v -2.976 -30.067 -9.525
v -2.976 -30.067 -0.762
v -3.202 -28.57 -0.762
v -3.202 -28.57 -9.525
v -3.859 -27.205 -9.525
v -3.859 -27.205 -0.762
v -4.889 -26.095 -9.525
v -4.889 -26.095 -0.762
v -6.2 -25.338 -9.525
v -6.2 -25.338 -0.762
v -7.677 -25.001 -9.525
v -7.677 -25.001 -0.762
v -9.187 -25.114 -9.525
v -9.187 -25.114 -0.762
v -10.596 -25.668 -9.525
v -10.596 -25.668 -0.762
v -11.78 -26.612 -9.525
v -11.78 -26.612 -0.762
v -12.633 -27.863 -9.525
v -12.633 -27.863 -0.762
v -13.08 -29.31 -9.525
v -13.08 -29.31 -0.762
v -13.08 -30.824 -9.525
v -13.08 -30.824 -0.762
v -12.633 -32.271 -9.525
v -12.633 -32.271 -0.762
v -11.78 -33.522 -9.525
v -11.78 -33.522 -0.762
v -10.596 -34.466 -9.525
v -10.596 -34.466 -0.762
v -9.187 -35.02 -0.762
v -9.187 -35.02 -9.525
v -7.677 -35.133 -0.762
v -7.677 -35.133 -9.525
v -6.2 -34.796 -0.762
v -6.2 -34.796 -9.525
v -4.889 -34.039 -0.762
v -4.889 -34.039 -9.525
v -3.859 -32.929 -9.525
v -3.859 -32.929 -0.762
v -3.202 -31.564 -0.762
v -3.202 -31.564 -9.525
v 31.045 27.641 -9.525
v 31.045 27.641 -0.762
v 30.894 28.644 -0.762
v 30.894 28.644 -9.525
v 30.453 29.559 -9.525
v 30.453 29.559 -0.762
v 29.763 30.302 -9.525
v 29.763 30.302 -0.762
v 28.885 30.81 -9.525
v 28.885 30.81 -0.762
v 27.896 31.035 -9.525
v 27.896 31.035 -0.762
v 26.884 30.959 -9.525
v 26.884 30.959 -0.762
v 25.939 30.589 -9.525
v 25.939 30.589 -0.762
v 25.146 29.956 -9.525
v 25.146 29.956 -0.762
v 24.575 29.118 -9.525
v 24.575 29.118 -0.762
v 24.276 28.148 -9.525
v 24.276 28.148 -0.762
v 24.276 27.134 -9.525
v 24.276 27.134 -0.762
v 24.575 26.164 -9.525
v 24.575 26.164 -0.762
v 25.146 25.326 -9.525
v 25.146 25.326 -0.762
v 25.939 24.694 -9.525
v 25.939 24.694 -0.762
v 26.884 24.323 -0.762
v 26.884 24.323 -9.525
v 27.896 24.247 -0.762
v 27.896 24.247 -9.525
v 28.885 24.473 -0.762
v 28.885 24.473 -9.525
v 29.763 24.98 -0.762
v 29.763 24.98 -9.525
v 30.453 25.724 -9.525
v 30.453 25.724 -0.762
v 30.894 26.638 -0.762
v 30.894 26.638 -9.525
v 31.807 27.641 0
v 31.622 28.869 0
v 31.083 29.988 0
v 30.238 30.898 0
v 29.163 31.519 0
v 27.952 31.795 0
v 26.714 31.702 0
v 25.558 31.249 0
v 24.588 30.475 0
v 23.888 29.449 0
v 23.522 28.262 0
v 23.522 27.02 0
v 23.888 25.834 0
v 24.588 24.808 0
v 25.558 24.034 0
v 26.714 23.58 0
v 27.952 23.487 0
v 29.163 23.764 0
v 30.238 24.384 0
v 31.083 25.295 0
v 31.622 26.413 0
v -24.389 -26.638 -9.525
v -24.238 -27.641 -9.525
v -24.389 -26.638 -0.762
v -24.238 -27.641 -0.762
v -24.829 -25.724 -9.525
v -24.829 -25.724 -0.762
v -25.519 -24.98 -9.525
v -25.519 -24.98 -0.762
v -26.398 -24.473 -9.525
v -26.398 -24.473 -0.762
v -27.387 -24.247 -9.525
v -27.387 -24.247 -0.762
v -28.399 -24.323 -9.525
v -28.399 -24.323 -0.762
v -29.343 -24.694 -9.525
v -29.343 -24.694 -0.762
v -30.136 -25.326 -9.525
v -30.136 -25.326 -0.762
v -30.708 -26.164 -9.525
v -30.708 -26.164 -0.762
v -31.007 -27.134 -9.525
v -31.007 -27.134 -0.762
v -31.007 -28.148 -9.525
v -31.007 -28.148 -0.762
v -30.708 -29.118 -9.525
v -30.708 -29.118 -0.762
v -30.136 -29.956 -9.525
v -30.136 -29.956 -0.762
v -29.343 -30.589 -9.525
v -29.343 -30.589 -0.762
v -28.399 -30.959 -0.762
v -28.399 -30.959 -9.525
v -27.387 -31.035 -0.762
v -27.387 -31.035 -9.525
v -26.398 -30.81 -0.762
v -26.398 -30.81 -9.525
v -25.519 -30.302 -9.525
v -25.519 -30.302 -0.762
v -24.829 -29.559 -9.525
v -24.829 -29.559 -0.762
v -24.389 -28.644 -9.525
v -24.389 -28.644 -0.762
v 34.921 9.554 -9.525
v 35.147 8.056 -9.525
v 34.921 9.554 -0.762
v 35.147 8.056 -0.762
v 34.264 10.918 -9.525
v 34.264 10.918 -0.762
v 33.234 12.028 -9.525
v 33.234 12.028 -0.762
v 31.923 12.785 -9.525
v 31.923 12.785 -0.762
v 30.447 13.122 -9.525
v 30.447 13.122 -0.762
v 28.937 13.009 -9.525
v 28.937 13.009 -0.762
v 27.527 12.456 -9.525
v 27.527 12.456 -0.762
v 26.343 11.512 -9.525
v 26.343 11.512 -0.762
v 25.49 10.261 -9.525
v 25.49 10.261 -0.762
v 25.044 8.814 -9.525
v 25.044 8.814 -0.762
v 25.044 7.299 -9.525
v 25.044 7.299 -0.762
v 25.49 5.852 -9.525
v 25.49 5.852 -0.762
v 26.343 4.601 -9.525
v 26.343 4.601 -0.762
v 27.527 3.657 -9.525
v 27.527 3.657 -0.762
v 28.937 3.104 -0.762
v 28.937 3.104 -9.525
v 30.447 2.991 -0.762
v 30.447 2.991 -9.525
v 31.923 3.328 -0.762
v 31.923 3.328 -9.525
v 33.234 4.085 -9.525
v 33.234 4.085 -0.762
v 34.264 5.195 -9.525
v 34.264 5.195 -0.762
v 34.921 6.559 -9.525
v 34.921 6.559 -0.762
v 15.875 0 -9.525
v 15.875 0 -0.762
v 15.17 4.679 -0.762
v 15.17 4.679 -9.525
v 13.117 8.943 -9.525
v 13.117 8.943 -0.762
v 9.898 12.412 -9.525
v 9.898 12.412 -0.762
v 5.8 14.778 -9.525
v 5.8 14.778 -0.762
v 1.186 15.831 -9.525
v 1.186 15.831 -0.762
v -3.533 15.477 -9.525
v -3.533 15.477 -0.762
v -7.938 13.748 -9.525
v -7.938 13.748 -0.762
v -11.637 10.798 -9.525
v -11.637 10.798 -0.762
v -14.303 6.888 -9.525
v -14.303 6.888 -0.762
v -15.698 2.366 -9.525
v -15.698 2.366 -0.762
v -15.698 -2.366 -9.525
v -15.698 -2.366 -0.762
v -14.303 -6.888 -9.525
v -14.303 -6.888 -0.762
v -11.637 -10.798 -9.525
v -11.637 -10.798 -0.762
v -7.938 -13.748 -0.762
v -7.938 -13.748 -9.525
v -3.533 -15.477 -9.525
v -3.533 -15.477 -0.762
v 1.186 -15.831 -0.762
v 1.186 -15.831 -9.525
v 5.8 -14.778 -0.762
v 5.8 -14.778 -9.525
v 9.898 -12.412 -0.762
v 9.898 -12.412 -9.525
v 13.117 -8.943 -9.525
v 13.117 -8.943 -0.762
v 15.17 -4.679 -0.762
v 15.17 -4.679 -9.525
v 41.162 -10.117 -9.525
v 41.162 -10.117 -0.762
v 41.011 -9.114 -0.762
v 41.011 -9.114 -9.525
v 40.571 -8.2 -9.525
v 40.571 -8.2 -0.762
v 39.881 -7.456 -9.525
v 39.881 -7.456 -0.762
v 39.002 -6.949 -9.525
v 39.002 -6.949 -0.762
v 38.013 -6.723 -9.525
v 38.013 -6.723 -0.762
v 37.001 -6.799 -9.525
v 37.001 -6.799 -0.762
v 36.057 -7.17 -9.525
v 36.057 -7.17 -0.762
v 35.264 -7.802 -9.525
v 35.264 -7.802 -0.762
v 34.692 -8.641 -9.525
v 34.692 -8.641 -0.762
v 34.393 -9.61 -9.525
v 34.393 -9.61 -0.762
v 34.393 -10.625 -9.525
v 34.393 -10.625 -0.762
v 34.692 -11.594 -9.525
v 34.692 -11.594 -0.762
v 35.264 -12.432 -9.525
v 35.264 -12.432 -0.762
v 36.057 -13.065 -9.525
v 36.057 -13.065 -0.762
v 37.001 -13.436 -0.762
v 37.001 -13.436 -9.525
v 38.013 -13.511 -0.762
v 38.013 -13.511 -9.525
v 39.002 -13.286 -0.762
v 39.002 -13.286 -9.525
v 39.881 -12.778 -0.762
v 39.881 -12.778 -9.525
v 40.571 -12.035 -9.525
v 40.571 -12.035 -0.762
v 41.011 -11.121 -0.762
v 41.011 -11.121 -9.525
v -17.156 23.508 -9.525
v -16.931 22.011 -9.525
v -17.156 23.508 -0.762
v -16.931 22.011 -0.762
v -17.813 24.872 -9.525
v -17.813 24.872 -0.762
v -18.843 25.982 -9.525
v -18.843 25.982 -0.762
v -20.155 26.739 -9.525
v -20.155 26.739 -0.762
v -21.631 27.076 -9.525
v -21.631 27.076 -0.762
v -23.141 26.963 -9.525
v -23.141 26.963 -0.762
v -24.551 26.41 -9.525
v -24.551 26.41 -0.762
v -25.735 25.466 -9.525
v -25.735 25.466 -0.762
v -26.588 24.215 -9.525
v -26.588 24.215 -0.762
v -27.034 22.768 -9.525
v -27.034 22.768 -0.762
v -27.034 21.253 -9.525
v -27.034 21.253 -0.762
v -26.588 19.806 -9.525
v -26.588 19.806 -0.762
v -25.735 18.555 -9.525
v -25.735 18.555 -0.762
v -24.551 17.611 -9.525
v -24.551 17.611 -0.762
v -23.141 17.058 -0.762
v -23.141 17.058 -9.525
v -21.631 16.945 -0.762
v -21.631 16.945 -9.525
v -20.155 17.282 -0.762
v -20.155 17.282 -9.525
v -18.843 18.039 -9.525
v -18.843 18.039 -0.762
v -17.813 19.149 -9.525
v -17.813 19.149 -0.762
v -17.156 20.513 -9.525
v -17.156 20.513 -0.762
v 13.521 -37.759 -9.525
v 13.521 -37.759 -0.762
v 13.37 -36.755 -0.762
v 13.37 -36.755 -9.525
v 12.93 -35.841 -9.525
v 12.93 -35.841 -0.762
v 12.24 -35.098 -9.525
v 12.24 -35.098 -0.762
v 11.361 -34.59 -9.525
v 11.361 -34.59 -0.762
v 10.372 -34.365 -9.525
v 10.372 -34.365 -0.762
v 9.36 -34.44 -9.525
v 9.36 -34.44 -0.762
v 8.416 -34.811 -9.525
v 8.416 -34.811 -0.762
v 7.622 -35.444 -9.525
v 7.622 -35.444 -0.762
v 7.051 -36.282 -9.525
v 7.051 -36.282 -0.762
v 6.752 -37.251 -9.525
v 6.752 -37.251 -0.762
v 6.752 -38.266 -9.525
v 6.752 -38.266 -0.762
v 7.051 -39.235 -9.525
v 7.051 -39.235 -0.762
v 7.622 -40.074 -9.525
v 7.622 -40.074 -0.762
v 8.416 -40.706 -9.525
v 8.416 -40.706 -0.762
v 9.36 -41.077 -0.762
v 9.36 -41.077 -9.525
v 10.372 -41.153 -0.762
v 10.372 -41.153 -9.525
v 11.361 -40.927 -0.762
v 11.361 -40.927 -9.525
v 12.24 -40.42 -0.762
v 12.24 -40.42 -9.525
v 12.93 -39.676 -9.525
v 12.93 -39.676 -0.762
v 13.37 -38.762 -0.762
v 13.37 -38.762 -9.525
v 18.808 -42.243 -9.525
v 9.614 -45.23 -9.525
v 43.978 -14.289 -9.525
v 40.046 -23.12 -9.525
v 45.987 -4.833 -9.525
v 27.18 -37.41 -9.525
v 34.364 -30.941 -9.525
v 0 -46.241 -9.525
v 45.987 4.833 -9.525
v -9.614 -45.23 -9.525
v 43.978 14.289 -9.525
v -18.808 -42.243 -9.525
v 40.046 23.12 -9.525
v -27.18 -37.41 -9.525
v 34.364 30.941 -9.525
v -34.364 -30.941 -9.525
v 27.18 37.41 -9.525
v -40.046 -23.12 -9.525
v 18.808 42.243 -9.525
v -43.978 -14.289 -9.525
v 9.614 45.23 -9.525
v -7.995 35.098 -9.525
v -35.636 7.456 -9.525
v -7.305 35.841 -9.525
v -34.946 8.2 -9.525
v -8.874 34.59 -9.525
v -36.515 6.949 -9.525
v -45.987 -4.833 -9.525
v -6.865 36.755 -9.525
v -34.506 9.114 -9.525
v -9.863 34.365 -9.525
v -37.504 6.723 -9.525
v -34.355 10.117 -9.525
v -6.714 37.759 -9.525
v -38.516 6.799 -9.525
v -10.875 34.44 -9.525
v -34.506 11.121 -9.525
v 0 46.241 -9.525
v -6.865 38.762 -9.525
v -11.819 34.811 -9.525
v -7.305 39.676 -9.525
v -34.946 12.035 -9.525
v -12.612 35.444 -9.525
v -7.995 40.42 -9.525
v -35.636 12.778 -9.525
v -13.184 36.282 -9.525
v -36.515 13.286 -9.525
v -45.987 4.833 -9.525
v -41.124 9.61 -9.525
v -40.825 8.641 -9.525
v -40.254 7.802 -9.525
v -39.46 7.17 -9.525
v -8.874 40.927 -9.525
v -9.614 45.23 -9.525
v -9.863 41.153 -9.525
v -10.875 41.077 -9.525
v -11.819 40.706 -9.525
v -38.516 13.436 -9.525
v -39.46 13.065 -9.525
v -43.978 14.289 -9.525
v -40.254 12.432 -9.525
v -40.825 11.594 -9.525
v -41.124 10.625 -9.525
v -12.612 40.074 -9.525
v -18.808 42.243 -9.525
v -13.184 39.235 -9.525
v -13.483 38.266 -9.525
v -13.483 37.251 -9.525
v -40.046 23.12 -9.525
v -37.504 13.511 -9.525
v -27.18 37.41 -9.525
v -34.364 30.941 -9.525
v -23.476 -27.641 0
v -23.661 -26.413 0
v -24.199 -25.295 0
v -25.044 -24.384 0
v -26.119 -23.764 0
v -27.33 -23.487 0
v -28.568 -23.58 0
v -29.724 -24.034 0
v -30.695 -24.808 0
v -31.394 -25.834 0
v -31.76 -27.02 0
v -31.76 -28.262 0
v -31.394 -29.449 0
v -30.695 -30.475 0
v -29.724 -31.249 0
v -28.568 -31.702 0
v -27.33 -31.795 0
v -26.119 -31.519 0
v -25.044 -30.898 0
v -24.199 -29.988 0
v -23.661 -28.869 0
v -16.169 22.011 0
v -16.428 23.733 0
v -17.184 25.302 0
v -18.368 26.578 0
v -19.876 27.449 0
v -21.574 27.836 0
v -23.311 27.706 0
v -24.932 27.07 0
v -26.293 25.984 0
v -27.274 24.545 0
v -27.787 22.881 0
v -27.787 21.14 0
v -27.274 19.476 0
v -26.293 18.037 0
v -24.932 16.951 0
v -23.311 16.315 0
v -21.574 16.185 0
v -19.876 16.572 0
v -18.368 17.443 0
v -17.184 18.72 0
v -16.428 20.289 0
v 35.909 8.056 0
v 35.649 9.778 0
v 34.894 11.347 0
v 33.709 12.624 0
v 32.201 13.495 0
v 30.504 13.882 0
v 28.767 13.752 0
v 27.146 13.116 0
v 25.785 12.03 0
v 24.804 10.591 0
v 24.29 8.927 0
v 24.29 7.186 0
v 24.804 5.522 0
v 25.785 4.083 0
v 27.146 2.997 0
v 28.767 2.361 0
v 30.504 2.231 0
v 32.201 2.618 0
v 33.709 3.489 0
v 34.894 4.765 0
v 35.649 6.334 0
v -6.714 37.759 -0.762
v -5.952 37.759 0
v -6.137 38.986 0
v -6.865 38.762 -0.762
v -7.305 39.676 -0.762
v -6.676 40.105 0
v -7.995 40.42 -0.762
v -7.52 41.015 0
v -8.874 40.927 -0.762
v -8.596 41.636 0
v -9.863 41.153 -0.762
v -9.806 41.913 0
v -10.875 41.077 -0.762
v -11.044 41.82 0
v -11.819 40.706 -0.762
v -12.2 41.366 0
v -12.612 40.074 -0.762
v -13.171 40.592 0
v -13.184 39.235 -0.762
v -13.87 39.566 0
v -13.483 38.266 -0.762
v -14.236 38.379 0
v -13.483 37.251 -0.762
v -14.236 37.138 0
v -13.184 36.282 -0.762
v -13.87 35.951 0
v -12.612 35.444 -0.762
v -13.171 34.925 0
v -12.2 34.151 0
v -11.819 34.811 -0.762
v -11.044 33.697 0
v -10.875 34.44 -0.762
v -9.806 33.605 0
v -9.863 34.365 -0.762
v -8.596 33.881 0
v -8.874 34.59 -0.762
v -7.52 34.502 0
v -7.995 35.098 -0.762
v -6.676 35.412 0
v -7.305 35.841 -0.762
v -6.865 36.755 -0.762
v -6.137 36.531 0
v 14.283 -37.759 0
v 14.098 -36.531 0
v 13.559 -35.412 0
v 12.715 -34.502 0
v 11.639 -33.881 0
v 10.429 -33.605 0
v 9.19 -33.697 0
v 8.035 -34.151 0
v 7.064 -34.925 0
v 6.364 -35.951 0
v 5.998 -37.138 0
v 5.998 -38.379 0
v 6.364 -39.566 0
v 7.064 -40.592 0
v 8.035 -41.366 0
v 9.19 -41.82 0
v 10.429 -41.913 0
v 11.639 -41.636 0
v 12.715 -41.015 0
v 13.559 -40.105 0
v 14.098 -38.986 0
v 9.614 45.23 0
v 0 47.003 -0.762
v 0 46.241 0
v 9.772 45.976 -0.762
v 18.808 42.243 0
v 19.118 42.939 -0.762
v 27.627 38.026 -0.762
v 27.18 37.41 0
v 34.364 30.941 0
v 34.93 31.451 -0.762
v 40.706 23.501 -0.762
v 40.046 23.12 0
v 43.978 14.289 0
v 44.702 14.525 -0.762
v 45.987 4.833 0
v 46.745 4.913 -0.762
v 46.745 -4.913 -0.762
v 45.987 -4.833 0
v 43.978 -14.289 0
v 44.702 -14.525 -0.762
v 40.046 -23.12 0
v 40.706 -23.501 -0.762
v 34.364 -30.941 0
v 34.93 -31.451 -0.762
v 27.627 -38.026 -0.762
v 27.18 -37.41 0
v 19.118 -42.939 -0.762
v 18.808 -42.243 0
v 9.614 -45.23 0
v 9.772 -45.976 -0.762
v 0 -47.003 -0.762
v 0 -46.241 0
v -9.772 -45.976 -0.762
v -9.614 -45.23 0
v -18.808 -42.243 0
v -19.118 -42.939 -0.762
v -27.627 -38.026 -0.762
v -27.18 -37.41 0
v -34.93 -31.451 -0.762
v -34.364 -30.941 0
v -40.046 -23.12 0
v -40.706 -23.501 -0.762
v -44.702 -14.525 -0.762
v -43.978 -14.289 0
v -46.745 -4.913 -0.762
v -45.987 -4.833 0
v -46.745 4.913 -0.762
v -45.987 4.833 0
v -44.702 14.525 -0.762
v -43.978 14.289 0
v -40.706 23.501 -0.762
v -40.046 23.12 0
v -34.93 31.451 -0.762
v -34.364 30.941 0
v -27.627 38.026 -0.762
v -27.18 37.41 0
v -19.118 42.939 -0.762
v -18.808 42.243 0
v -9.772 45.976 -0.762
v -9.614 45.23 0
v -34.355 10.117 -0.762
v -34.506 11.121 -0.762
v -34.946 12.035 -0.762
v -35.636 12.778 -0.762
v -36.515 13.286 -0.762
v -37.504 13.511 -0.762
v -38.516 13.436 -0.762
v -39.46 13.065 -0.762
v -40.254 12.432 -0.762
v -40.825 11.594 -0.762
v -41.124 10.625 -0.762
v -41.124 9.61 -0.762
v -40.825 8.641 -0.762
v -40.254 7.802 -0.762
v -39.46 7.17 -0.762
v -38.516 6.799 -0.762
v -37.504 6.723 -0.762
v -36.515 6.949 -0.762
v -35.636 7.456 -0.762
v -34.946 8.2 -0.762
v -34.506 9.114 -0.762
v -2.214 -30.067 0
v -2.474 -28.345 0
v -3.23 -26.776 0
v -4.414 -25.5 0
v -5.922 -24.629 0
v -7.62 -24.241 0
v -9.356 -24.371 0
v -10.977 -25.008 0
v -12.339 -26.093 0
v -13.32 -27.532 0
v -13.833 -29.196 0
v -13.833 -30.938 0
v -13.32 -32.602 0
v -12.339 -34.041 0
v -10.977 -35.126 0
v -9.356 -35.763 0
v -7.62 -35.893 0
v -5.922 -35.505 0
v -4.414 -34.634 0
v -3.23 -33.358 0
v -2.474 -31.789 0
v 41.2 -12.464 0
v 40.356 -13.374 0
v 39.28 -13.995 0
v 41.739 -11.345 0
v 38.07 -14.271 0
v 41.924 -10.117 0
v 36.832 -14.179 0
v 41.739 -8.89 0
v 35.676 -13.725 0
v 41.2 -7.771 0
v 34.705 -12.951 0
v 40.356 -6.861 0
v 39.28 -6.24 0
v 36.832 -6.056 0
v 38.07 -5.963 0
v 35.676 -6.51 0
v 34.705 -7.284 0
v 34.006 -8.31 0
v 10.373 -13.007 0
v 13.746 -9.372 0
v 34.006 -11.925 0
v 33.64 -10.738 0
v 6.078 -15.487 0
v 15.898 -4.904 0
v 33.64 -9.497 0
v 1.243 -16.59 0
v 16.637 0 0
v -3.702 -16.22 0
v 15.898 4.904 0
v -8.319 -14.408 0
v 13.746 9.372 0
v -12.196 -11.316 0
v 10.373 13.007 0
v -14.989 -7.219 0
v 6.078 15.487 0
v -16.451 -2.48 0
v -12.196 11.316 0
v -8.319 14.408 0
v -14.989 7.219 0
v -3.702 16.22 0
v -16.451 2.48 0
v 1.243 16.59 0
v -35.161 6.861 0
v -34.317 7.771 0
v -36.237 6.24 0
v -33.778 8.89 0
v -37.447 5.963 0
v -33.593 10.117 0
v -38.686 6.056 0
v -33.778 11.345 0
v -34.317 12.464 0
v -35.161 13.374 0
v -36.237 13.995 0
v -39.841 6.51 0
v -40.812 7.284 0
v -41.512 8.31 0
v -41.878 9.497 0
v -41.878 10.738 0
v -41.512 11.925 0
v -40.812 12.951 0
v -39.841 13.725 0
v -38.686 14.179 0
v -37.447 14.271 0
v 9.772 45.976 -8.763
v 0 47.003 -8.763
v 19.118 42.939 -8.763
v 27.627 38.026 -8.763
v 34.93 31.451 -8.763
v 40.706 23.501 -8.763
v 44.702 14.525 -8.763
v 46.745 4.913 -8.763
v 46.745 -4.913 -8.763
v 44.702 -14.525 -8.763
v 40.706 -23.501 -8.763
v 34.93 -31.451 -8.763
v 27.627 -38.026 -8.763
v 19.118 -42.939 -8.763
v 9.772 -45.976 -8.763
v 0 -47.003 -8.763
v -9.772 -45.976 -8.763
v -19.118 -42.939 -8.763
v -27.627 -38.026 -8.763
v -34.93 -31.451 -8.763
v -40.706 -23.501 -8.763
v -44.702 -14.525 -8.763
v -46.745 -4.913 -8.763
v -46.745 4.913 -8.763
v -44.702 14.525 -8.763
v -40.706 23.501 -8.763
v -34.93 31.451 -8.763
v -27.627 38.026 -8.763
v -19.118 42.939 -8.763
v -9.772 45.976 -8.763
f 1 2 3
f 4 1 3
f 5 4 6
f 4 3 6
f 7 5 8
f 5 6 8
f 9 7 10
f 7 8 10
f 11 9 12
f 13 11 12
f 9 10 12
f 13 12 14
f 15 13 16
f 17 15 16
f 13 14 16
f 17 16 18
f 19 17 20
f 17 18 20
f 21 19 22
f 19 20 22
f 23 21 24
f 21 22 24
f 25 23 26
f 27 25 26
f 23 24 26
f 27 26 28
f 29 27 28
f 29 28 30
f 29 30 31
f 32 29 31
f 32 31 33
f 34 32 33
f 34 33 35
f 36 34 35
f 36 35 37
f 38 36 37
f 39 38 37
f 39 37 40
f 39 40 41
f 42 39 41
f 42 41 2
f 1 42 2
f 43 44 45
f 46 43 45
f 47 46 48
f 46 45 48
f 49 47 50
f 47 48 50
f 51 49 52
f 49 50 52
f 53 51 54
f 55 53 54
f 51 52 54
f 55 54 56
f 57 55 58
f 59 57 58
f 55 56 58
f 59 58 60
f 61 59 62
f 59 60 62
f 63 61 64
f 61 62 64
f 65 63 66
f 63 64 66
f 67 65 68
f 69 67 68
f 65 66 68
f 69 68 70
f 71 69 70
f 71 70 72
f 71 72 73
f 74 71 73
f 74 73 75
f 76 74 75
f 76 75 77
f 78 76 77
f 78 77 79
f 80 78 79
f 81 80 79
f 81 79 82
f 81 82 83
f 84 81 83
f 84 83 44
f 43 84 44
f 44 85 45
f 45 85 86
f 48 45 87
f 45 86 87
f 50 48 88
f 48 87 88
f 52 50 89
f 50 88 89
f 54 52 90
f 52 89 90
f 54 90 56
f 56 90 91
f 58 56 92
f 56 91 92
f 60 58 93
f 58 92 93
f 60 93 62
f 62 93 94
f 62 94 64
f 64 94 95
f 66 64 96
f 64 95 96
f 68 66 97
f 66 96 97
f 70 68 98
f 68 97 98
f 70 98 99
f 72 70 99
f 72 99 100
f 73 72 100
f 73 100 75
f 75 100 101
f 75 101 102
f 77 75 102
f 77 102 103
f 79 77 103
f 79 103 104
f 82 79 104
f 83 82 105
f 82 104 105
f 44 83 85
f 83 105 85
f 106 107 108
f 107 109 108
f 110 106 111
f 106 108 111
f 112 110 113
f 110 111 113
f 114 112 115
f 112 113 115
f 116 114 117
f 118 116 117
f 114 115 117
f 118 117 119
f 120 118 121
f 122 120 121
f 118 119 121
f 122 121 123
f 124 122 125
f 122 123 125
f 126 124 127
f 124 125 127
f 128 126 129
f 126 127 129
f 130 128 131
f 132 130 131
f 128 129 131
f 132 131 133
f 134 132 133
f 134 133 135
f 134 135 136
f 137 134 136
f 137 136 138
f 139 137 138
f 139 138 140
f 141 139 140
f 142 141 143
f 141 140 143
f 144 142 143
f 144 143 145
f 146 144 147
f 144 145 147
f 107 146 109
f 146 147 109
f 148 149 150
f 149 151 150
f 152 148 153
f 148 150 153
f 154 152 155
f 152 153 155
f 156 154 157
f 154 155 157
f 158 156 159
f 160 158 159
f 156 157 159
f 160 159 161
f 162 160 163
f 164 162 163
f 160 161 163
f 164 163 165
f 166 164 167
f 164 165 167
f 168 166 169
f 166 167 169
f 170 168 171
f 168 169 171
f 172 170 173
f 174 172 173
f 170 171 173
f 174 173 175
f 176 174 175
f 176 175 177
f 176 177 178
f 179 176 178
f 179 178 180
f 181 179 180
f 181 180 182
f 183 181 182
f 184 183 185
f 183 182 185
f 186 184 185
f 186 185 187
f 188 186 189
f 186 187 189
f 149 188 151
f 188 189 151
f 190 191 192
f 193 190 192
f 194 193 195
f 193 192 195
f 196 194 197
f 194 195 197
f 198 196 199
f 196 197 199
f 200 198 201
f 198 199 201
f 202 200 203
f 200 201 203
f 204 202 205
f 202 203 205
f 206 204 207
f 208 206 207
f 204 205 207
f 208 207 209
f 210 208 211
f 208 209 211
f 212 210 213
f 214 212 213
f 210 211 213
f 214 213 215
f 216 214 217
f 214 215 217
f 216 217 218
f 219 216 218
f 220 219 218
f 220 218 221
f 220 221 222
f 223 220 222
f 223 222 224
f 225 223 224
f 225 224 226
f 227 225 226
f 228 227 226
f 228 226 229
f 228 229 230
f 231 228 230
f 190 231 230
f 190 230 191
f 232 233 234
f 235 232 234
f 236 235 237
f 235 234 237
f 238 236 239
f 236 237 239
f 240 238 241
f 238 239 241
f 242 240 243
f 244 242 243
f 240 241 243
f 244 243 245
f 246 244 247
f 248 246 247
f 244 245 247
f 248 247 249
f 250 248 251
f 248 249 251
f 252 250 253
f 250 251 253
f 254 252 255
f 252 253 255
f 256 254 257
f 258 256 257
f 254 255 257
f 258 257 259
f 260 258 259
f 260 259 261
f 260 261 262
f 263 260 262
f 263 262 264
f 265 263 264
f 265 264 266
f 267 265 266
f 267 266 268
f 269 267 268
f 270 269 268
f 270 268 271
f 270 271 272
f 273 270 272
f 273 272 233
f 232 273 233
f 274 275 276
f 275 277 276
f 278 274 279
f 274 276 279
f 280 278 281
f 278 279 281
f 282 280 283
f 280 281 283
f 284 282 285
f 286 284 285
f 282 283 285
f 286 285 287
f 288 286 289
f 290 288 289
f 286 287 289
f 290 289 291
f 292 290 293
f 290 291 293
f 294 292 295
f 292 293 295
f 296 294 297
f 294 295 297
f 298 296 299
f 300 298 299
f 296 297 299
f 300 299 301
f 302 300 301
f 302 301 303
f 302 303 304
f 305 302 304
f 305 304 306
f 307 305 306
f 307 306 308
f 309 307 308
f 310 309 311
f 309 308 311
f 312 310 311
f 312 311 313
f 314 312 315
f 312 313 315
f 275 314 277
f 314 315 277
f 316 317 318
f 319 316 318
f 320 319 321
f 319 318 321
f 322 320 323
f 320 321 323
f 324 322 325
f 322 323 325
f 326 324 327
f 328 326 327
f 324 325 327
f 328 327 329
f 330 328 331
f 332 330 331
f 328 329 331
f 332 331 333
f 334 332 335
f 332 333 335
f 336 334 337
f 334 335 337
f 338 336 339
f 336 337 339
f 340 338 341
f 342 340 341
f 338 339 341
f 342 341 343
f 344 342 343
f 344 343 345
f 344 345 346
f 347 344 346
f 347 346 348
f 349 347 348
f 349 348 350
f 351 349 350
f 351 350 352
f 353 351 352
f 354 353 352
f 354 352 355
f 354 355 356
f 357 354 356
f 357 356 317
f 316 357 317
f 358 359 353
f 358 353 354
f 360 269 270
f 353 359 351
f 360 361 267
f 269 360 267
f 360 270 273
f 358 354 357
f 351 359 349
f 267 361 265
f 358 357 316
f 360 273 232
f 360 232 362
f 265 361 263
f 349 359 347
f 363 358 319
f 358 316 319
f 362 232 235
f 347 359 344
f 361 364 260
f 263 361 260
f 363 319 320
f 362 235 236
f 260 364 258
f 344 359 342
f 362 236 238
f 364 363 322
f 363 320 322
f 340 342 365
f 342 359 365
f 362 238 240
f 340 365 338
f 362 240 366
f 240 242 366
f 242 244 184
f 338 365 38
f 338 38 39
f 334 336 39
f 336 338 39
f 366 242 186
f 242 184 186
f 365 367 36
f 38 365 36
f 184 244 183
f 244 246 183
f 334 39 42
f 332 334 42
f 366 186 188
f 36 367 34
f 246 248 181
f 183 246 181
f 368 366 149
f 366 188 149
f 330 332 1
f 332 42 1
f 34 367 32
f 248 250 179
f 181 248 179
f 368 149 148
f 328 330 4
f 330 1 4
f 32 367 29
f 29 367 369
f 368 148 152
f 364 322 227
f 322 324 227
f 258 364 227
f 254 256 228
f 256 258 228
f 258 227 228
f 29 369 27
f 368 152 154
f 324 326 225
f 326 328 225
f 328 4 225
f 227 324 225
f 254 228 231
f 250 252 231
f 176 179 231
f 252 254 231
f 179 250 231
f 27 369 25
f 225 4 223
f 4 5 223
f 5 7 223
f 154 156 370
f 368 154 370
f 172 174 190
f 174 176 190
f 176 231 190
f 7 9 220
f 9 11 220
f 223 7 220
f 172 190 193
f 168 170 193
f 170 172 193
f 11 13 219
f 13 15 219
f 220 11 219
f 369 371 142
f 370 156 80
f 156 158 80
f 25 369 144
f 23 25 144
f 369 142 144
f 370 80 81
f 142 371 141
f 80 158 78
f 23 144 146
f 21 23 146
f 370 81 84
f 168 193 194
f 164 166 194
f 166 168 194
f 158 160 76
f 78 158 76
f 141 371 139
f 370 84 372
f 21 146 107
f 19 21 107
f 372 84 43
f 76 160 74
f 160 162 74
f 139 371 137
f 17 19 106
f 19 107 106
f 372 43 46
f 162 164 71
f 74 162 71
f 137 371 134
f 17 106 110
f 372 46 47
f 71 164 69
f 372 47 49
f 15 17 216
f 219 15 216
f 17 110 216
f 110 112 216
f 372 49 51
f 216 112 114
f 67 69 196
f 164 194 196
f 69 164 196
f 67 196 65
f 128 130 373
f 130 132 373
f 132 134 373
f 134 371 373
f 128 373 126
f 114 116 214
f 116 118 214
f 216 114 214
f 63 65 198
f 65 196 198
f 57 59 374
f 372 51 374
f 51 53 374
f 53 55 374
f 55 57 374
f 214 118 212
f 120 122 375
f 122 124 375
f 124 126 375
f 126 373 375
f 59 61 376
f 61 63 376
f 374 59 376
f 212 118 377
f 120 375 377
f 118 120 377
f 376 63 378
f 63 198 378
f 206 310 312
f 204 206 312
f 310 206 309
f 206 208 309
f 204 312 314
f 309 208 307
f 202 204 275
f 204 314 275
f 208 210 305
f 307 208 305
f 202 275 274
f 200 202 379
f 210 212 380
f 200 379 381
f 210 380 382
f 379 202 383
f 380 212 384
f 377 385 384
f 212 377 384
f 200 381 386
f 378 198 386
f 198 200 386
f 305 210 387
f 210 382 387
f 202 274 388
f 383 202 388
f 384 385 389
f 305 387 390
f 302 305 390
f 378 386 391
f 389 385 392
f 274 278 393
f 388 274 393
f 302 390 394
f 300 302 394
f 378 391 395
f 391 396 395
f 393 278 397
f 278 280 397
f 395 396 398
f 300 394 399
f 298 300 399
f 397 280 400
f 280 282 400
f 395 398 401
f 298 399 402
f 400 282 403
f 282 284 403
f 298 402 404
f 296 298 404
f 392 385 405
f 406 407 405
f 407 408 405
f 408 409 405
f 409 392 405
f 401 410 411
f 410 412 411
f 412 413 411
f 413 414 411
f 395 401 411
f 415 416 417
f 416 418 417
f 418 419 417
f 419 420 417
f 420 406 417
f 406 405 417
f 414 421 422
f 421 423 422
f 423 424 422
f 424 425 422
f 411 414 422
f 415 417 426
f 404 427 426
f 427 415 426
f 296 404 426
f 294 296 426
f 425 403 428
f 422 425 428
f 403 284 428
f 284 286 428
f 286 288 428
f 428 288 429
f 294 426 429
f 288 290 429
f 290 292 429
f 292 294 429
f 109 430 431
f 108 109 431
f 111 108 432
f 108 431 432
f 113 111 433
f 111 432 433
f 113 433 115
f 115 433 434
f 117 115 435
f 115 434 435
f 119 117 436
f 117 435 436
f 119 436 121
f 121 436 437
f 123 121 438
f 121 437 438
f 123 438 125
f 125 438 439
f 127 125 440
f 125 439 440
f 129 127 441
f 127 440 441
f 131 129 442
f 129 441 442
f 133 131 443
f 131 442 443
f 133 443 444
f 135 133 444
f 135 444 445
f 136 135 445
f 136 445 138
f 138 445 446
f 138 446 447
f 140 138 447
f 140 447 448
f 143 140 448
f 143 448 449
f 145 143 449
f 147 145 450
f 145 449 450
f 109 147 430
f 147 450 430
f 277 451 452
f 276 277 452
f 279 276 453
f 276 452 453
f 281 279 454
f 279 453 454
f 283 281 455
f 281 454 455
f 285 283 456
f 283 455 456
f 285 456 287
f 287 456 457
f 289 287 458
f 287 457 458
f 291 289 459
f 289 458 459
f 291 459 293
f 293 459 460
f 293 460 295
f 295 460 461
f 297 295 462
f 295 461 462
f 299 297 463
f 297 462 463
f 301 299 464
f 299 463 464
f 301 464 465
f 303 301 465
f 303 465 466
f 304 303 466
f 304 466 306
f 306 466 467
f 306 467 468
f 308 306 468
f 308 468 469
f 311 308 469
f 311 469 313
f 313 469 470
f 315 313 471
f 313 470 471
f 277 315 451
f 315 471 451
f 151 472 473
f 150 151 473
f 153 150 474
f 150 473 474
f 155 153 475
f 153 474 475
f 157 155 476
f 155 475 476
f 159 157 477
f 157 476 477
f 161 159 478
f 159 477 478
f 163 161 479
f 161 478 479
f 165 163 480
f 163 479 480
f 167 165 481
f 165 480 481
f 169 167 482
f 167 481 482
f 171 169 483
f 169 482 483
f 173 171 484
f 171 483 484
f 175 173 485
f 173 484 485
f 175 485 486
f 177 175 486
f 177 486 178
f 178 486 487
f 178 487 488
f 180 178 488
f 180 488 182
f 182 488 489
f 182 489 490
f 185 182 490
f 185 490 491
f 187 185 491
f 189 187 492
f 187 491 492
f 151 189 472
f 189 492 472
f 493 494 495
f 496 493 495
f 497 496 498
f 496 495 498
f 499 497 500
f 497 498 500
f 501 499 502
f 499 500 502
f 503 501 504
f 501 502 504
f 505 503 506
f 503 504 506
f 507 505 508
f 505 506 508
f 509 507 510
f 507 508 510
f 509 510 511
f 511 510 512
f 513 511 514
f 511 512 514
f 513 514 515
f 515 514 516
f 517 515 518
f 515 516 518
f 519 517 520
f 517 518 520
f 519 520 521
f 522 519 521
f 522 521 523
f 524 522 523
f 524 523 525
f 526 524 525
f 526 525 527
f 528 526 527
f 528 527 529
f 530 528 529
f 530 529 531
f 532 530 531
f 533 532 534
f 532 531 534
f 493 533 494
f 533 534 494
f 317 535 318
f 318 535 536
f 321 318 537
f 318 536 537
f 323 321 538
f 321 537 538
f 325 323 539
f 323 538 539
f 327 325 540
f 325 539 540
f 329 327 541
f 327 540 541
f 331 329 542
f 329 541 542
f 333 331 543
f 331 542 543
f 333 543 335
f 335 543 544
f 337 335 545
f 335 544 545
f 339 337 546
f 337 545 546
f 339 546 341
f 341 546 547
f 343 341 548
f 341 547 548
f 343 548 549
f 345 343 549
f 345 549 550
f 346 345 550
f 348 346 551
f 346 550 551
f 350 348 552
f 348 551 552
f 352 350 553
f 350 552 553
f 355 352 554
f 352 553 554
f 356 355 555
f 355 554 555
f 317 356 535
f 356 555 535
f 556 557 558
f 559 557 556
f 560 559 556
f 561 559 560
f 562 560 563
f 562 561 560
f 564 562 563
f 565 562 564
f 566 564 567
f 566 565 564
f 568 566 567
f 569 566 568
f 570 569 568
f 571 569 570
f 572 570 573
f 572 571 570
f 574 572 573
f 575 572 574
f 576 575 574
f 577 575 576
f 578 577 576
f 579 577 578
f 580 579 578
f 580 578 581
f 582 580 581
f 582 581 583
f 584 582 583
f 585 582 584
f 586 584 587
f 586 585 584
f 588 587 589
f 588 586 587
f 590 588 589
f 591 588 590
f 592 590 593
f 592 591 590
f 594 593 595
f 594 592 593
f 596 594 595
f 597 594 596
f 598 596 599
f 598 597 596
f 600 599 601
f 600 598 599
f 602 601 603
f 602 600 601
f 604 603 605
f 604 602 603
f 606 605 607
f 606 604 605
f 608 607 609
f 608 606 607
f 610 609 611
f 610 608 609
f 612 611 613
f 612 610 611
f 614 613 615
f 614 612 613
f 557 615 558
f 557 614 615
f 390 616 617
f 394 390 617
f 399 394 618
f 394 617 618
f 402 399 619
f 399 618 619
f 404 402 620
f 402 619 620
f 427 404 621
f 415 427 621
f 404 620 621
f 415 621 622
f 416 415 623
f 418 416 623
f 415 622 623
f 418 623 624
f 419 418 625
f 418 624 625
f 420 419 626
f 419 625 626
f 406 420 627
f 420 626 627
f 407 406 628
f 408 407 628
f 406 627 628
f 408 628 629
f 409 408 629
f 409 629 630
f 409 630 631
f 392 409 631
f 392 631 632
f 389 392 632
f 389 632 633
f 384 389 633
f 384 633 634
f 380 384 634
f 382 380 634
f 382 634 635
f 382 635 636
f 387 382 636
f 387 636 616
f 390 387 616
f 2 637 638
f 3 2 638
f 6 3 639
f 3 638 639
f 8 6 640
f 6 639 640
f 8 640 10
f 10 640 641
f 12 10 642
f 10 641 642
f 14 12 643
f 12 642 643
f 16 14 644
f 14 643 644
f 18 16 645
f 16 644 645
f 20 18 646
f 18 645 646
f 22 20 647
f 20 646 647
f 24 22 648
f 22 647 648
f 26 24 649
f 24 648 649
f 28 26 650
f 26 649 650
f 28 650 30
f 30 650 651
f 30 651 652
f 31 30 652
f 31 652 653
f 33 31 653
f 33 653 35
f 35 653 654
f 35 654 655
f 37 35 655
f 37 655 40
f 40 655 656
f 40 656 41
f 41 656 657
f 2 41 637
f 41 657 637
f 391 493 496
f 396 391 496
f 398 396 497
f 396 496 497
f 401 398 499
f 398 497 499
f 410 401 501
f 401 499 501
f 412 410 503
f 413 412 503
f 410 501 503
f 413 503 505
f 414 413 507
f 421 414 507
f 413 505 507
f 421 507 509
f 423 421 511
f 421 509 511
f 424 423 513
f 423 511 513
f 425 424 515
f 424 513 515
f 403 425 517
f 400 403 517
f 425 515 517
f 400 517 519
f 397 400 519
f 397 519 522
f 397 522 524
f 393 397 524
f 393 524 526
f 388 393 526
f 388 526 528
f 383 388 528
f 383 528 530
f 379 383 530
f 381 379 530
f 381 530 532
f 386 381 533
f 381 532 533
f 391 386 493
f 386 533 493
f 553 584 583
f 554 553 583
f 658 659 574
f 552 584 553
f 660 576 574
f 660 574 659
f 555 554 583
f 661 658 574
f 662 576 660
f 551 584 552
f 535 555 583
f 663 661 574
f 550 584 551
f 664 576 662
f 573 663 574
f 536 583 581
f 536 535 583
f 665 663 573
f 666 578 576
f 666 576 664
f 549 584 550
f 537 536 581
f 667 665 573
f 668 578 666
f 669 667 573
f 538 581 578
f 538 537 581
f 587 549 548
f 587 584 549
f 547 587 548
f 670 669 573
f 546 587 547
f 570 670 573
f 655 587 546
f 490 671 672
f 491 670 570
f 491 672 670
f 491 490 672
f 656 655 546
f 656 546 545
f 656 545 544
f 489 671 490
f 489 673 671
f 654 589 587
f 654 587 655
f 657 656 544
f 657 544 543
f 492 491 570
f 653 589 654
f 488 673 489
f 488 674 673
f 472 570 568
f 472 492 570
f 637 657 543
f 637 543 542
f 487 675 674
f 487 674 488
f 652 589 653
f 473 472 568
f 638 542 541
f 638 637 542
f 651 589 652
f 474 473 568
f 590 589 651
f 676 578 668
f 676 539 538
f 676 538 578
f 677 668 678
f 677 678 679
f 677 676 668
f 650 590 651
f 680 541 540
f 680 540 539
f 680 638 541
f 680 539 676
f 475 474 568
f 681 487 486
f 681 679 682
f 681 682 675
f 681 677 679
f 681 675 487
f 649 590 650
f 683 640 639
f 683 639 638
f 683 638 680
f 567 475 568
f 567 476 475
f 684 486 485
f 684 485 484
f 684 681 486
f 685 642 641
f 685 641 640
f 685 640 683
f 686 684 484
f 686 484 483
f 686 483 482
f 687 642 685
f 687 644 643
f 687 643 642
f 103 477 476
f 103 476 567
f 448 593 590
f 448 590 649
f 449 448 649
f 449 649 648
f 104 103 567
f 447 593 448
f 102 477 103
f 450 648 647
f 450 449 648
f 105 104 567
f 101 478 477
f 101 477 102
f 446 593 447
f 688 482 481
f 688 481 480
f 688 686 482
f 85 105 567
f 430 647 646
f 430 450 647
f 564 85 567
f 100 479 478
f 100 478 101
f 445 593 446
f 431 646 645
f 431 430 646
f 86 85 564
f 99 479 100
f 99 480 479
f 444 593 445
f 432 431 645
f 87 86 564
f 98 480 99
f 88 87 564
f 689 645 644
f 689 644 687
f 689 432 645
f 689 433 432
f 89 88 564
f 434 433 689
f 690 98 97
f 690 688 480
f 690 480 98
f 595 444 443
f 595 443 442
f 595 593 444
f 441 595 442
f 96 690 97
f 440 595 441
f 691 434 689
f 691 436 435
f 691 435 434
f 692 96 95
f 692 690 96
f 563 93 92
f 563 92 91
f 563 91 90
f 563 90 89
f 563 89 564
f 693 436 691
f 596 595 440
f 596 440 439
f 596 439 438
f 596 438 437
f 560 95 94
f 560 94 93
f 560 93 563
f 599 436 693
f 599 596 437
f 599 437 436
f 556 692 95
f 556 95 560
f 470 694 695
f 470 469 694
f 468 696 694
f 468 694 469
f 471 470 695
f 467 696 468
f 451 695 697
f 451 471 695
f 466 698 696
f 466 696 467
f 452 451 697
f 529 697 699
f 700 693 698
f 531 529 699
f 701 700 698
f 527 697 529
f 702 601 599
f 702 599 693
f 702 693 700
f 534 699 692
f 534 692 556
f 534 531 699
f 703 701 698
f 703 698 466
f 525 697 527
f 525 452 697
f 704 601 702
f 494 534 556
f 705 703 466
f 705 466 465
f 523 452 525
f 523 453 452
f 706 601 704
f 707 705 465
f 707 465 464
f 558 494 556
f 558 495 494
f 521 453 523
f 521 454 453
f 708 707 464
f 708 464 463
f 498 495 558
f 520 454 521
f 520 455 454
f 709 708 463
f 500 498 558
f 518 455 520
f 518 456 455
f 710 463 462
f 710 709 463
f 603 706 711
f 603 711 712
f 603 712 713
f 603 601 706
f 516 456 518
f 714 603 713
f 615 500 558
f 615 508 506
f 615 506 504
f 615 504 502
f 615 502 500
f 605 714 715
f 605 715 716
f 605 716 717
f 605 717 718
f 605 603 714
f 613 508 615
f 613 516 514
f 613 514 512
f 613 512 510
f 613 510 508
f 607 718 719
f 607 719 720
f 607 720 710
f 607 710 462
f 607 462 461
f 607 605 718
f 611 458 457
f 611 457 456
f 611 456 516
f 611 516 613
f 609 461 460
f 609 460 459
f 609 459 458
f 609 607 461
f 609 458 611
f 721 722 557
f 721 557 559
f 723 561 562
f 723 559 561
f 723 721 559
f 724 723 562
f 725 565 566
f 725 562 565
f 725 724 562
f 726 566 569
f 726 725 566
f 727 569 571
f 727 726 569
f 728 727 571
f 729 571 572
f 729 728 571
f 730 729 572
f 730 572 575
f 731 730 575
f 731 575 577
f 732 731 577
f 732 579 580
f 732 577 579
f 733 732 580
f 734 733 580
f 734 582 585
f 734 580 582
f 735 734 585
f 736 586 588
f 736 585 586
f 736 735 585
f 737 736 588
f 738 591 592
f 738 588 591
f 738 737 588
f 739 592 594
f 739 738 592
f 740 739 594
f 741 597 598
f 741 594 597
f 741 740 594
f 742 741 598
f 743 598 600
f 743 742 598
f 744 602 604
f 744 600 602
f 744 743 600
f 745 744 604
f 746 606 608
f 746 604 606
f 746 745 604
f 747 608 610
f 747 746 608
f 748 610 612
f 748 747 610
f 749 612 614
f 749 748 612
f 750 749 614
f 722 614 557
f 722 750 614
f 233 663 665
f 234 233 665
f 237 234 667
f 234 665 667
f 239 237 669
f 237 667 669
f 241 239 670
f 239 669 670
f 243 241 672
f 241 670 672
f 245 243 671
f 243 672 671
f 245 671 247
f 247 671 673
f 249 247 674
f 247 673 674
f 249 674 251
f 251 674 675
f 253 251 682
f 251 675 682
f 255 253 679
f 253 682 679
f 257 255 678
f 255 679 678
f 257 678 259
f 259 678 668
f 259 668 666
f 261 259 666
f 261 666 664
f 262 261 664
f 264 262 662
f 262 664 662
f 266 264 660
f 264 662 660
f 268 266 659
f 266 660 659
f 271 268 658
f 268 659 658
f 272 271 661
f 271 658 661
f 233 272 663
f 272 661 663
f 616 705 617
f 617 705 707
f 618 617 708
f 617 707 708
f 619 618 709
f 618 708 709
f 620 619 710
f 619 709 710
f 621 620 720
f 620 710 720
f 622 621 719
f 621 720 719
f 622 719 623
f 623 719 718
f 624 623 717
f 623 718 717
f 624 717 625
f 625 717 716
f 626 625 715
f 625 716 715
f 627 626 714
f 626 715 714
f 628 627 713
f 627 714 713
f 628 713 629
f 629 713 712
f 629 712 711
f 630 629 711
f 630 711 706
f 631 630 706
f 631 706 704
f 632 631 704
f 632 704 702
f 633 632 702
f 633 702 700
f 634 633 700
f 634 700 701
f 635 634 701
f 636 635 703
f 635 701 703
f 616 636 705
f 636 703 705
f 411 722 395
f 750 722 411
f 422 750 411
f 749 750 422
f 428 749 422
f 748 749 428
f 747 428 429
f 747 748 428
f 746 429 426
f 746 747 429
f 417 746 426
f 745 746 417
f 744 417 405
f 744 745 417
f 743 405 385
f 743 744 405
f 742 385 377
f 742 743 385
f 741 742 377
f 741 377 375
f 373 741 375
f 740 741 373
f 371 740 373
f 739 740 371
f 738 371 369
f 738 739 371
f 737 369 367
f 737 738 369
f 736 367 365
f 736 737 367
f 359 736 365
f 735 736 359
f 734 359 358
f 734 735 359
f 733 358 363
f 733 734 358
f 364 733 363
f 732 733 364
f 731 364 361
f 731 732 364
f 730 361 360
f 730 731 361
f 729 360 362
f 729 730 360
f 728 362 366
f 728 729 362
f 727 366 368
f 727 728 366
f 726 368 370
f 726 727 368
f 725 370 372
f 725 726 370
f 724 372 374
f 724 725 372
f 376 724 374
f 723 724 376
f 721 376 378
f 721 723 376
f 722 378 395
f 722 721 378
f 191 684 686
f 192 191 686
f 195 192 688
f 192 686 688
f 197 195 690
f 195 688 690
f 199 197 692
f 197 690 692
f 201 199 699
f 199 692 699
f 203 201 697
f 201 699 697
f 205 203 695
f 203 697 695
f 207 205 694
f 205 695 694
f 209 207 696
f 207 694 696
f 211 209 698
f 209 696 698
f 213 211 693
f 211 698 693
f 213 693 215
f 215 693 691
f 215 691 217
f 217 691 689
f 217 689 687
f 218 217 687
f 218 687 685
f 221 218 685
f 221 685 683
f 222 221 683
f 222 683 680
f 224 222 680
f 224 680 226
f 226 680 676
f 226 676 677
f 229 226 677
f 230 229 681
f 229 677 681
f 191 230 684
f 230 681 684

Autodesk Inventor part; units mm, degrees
ref_plane "YZ Plane" through (0, 0, 0) normal (1, 0, 0) x (0, 1, 0)
ref_plane "XZ Plane" through (0, 0, 0) normal (0, 1, 0) x (-1, 0, 0)
ref_plane "XY Plane" through (0, 0, 0) normal (0, 0, 1) x (1, 0, 0)
sketch "Sketch1" plane through (0, 0, 0) normal (1, 0, 0) x (0, 1, 0)
  line L0 (0, 0) -> (47.0027, 0)
  line L1 (47.0027, 0) -> (47.0027, -9.525)
  line L2 (47.0027, -9.525) -> (0, -9.525)
  line L3 (0, -9.525) -> (0, 0)
  dimension "d0" = 47.0027
  dimension "d1" = 9.525
revolve "Revolution1" add sketch "Sketch1" angle 360 about axis through (0, 0, -9.525) along (0, 0, 1)
sketch "Sketch2" plane through (0, 0, 0) normal (0, 0, 1) x (1, 0, 0)
  circle A0 centre (0, 0) radius 39.0906
  line L0 (0, 0) -> (27.6412, 27.6412)
  line L1 (0, 0) -> (39.0906, 0) construction
  circle A1 centre (27.6412, 27.6412) radius 3.4036
  circle A2 centre (37.7586, -10.1174) radius 3.4036
  circle A3 centre (10.1174, -37.7586) radius 3.4036
  circle A4 centre (-27.6412, -27.6412) radius 3.4036
  circle A5 centre (-37.7586, 10.1174) radius 3.4036
  circle A6 centre (-10.1174, 37.7586) radius 3.4036
  point P0 (0, 0)
  dimension "d3" = 78.1812
  dimension "d4" = 45
  dimension "d5" = 6.8072
  dimension "d8" = 360
extrude "Extrusion1" cut sketch "Sketch2" against normal blind 9.525 contours A1 L0 A0 | A0 A1 | A2 A0 | A0 A2 | L0 A1 A0 | A3 A0 | A0 A3 | A6 A0 | A0 A6 | A4 A0 | A0 A4 | A5 A0 | A0 A5
sketch "Sketch3" plane through (0, 0, 0) normal (0, 0, 1) x (1, 0, 0)
  circle A0 centre (0, 0) radius 31.1277
  line L0 (0, 0) -> (-22.0106, 22.0106)
  line L1 (0, 0) -> (31.1277, 0) construction
  circle A1 centre (-27.6412, -27.6412) radius 3.4036 projected
  circle A2 centre (-22.0106, 22.0106) radius 5.08
  circle A3 centre (-8.0564, -30.067) radius 5.08
  circle A4 centre (30.067, 8.0564) radius 5.08
  circle A5 centre (0, 0) radius 15.875
  point P0 (0, 0)
  dimension "d12" = 62.2554
  dimension "d13" = 135
  dimension "d14" = 10.16
  dimension "d17" = 360
  dimension "d21" = 31.75
extrude "Extrusion2" cut sketch "Sketch3" against normal blind 9.525 contours A5 | A4 A0 | A0 A4 | A3 A0 | A0 A3 | A2 L0 A0 | A0 A2 | A0 L0 A2
chamfer "Chamfer1" distance 0.762 angle 45 12 edges at (-15.875, 0, 0) (0, -47.0027, 0) (0, -47.0027, -9.525) (24.987, 8.0564, 0) (24.2376, 27.6412, 0) (-13.521, 37.7586, 0) (-27.0906, 22.0106, 0) (-41.1622, 10.1174, 0) (-31.0448, -27.6412, 0) (-13.1364, -30.067, 0) (6.7138, -37.7586, 0) (34.355, -10.1174, 0)
properties part number "Motor_Adapter_Flex"
